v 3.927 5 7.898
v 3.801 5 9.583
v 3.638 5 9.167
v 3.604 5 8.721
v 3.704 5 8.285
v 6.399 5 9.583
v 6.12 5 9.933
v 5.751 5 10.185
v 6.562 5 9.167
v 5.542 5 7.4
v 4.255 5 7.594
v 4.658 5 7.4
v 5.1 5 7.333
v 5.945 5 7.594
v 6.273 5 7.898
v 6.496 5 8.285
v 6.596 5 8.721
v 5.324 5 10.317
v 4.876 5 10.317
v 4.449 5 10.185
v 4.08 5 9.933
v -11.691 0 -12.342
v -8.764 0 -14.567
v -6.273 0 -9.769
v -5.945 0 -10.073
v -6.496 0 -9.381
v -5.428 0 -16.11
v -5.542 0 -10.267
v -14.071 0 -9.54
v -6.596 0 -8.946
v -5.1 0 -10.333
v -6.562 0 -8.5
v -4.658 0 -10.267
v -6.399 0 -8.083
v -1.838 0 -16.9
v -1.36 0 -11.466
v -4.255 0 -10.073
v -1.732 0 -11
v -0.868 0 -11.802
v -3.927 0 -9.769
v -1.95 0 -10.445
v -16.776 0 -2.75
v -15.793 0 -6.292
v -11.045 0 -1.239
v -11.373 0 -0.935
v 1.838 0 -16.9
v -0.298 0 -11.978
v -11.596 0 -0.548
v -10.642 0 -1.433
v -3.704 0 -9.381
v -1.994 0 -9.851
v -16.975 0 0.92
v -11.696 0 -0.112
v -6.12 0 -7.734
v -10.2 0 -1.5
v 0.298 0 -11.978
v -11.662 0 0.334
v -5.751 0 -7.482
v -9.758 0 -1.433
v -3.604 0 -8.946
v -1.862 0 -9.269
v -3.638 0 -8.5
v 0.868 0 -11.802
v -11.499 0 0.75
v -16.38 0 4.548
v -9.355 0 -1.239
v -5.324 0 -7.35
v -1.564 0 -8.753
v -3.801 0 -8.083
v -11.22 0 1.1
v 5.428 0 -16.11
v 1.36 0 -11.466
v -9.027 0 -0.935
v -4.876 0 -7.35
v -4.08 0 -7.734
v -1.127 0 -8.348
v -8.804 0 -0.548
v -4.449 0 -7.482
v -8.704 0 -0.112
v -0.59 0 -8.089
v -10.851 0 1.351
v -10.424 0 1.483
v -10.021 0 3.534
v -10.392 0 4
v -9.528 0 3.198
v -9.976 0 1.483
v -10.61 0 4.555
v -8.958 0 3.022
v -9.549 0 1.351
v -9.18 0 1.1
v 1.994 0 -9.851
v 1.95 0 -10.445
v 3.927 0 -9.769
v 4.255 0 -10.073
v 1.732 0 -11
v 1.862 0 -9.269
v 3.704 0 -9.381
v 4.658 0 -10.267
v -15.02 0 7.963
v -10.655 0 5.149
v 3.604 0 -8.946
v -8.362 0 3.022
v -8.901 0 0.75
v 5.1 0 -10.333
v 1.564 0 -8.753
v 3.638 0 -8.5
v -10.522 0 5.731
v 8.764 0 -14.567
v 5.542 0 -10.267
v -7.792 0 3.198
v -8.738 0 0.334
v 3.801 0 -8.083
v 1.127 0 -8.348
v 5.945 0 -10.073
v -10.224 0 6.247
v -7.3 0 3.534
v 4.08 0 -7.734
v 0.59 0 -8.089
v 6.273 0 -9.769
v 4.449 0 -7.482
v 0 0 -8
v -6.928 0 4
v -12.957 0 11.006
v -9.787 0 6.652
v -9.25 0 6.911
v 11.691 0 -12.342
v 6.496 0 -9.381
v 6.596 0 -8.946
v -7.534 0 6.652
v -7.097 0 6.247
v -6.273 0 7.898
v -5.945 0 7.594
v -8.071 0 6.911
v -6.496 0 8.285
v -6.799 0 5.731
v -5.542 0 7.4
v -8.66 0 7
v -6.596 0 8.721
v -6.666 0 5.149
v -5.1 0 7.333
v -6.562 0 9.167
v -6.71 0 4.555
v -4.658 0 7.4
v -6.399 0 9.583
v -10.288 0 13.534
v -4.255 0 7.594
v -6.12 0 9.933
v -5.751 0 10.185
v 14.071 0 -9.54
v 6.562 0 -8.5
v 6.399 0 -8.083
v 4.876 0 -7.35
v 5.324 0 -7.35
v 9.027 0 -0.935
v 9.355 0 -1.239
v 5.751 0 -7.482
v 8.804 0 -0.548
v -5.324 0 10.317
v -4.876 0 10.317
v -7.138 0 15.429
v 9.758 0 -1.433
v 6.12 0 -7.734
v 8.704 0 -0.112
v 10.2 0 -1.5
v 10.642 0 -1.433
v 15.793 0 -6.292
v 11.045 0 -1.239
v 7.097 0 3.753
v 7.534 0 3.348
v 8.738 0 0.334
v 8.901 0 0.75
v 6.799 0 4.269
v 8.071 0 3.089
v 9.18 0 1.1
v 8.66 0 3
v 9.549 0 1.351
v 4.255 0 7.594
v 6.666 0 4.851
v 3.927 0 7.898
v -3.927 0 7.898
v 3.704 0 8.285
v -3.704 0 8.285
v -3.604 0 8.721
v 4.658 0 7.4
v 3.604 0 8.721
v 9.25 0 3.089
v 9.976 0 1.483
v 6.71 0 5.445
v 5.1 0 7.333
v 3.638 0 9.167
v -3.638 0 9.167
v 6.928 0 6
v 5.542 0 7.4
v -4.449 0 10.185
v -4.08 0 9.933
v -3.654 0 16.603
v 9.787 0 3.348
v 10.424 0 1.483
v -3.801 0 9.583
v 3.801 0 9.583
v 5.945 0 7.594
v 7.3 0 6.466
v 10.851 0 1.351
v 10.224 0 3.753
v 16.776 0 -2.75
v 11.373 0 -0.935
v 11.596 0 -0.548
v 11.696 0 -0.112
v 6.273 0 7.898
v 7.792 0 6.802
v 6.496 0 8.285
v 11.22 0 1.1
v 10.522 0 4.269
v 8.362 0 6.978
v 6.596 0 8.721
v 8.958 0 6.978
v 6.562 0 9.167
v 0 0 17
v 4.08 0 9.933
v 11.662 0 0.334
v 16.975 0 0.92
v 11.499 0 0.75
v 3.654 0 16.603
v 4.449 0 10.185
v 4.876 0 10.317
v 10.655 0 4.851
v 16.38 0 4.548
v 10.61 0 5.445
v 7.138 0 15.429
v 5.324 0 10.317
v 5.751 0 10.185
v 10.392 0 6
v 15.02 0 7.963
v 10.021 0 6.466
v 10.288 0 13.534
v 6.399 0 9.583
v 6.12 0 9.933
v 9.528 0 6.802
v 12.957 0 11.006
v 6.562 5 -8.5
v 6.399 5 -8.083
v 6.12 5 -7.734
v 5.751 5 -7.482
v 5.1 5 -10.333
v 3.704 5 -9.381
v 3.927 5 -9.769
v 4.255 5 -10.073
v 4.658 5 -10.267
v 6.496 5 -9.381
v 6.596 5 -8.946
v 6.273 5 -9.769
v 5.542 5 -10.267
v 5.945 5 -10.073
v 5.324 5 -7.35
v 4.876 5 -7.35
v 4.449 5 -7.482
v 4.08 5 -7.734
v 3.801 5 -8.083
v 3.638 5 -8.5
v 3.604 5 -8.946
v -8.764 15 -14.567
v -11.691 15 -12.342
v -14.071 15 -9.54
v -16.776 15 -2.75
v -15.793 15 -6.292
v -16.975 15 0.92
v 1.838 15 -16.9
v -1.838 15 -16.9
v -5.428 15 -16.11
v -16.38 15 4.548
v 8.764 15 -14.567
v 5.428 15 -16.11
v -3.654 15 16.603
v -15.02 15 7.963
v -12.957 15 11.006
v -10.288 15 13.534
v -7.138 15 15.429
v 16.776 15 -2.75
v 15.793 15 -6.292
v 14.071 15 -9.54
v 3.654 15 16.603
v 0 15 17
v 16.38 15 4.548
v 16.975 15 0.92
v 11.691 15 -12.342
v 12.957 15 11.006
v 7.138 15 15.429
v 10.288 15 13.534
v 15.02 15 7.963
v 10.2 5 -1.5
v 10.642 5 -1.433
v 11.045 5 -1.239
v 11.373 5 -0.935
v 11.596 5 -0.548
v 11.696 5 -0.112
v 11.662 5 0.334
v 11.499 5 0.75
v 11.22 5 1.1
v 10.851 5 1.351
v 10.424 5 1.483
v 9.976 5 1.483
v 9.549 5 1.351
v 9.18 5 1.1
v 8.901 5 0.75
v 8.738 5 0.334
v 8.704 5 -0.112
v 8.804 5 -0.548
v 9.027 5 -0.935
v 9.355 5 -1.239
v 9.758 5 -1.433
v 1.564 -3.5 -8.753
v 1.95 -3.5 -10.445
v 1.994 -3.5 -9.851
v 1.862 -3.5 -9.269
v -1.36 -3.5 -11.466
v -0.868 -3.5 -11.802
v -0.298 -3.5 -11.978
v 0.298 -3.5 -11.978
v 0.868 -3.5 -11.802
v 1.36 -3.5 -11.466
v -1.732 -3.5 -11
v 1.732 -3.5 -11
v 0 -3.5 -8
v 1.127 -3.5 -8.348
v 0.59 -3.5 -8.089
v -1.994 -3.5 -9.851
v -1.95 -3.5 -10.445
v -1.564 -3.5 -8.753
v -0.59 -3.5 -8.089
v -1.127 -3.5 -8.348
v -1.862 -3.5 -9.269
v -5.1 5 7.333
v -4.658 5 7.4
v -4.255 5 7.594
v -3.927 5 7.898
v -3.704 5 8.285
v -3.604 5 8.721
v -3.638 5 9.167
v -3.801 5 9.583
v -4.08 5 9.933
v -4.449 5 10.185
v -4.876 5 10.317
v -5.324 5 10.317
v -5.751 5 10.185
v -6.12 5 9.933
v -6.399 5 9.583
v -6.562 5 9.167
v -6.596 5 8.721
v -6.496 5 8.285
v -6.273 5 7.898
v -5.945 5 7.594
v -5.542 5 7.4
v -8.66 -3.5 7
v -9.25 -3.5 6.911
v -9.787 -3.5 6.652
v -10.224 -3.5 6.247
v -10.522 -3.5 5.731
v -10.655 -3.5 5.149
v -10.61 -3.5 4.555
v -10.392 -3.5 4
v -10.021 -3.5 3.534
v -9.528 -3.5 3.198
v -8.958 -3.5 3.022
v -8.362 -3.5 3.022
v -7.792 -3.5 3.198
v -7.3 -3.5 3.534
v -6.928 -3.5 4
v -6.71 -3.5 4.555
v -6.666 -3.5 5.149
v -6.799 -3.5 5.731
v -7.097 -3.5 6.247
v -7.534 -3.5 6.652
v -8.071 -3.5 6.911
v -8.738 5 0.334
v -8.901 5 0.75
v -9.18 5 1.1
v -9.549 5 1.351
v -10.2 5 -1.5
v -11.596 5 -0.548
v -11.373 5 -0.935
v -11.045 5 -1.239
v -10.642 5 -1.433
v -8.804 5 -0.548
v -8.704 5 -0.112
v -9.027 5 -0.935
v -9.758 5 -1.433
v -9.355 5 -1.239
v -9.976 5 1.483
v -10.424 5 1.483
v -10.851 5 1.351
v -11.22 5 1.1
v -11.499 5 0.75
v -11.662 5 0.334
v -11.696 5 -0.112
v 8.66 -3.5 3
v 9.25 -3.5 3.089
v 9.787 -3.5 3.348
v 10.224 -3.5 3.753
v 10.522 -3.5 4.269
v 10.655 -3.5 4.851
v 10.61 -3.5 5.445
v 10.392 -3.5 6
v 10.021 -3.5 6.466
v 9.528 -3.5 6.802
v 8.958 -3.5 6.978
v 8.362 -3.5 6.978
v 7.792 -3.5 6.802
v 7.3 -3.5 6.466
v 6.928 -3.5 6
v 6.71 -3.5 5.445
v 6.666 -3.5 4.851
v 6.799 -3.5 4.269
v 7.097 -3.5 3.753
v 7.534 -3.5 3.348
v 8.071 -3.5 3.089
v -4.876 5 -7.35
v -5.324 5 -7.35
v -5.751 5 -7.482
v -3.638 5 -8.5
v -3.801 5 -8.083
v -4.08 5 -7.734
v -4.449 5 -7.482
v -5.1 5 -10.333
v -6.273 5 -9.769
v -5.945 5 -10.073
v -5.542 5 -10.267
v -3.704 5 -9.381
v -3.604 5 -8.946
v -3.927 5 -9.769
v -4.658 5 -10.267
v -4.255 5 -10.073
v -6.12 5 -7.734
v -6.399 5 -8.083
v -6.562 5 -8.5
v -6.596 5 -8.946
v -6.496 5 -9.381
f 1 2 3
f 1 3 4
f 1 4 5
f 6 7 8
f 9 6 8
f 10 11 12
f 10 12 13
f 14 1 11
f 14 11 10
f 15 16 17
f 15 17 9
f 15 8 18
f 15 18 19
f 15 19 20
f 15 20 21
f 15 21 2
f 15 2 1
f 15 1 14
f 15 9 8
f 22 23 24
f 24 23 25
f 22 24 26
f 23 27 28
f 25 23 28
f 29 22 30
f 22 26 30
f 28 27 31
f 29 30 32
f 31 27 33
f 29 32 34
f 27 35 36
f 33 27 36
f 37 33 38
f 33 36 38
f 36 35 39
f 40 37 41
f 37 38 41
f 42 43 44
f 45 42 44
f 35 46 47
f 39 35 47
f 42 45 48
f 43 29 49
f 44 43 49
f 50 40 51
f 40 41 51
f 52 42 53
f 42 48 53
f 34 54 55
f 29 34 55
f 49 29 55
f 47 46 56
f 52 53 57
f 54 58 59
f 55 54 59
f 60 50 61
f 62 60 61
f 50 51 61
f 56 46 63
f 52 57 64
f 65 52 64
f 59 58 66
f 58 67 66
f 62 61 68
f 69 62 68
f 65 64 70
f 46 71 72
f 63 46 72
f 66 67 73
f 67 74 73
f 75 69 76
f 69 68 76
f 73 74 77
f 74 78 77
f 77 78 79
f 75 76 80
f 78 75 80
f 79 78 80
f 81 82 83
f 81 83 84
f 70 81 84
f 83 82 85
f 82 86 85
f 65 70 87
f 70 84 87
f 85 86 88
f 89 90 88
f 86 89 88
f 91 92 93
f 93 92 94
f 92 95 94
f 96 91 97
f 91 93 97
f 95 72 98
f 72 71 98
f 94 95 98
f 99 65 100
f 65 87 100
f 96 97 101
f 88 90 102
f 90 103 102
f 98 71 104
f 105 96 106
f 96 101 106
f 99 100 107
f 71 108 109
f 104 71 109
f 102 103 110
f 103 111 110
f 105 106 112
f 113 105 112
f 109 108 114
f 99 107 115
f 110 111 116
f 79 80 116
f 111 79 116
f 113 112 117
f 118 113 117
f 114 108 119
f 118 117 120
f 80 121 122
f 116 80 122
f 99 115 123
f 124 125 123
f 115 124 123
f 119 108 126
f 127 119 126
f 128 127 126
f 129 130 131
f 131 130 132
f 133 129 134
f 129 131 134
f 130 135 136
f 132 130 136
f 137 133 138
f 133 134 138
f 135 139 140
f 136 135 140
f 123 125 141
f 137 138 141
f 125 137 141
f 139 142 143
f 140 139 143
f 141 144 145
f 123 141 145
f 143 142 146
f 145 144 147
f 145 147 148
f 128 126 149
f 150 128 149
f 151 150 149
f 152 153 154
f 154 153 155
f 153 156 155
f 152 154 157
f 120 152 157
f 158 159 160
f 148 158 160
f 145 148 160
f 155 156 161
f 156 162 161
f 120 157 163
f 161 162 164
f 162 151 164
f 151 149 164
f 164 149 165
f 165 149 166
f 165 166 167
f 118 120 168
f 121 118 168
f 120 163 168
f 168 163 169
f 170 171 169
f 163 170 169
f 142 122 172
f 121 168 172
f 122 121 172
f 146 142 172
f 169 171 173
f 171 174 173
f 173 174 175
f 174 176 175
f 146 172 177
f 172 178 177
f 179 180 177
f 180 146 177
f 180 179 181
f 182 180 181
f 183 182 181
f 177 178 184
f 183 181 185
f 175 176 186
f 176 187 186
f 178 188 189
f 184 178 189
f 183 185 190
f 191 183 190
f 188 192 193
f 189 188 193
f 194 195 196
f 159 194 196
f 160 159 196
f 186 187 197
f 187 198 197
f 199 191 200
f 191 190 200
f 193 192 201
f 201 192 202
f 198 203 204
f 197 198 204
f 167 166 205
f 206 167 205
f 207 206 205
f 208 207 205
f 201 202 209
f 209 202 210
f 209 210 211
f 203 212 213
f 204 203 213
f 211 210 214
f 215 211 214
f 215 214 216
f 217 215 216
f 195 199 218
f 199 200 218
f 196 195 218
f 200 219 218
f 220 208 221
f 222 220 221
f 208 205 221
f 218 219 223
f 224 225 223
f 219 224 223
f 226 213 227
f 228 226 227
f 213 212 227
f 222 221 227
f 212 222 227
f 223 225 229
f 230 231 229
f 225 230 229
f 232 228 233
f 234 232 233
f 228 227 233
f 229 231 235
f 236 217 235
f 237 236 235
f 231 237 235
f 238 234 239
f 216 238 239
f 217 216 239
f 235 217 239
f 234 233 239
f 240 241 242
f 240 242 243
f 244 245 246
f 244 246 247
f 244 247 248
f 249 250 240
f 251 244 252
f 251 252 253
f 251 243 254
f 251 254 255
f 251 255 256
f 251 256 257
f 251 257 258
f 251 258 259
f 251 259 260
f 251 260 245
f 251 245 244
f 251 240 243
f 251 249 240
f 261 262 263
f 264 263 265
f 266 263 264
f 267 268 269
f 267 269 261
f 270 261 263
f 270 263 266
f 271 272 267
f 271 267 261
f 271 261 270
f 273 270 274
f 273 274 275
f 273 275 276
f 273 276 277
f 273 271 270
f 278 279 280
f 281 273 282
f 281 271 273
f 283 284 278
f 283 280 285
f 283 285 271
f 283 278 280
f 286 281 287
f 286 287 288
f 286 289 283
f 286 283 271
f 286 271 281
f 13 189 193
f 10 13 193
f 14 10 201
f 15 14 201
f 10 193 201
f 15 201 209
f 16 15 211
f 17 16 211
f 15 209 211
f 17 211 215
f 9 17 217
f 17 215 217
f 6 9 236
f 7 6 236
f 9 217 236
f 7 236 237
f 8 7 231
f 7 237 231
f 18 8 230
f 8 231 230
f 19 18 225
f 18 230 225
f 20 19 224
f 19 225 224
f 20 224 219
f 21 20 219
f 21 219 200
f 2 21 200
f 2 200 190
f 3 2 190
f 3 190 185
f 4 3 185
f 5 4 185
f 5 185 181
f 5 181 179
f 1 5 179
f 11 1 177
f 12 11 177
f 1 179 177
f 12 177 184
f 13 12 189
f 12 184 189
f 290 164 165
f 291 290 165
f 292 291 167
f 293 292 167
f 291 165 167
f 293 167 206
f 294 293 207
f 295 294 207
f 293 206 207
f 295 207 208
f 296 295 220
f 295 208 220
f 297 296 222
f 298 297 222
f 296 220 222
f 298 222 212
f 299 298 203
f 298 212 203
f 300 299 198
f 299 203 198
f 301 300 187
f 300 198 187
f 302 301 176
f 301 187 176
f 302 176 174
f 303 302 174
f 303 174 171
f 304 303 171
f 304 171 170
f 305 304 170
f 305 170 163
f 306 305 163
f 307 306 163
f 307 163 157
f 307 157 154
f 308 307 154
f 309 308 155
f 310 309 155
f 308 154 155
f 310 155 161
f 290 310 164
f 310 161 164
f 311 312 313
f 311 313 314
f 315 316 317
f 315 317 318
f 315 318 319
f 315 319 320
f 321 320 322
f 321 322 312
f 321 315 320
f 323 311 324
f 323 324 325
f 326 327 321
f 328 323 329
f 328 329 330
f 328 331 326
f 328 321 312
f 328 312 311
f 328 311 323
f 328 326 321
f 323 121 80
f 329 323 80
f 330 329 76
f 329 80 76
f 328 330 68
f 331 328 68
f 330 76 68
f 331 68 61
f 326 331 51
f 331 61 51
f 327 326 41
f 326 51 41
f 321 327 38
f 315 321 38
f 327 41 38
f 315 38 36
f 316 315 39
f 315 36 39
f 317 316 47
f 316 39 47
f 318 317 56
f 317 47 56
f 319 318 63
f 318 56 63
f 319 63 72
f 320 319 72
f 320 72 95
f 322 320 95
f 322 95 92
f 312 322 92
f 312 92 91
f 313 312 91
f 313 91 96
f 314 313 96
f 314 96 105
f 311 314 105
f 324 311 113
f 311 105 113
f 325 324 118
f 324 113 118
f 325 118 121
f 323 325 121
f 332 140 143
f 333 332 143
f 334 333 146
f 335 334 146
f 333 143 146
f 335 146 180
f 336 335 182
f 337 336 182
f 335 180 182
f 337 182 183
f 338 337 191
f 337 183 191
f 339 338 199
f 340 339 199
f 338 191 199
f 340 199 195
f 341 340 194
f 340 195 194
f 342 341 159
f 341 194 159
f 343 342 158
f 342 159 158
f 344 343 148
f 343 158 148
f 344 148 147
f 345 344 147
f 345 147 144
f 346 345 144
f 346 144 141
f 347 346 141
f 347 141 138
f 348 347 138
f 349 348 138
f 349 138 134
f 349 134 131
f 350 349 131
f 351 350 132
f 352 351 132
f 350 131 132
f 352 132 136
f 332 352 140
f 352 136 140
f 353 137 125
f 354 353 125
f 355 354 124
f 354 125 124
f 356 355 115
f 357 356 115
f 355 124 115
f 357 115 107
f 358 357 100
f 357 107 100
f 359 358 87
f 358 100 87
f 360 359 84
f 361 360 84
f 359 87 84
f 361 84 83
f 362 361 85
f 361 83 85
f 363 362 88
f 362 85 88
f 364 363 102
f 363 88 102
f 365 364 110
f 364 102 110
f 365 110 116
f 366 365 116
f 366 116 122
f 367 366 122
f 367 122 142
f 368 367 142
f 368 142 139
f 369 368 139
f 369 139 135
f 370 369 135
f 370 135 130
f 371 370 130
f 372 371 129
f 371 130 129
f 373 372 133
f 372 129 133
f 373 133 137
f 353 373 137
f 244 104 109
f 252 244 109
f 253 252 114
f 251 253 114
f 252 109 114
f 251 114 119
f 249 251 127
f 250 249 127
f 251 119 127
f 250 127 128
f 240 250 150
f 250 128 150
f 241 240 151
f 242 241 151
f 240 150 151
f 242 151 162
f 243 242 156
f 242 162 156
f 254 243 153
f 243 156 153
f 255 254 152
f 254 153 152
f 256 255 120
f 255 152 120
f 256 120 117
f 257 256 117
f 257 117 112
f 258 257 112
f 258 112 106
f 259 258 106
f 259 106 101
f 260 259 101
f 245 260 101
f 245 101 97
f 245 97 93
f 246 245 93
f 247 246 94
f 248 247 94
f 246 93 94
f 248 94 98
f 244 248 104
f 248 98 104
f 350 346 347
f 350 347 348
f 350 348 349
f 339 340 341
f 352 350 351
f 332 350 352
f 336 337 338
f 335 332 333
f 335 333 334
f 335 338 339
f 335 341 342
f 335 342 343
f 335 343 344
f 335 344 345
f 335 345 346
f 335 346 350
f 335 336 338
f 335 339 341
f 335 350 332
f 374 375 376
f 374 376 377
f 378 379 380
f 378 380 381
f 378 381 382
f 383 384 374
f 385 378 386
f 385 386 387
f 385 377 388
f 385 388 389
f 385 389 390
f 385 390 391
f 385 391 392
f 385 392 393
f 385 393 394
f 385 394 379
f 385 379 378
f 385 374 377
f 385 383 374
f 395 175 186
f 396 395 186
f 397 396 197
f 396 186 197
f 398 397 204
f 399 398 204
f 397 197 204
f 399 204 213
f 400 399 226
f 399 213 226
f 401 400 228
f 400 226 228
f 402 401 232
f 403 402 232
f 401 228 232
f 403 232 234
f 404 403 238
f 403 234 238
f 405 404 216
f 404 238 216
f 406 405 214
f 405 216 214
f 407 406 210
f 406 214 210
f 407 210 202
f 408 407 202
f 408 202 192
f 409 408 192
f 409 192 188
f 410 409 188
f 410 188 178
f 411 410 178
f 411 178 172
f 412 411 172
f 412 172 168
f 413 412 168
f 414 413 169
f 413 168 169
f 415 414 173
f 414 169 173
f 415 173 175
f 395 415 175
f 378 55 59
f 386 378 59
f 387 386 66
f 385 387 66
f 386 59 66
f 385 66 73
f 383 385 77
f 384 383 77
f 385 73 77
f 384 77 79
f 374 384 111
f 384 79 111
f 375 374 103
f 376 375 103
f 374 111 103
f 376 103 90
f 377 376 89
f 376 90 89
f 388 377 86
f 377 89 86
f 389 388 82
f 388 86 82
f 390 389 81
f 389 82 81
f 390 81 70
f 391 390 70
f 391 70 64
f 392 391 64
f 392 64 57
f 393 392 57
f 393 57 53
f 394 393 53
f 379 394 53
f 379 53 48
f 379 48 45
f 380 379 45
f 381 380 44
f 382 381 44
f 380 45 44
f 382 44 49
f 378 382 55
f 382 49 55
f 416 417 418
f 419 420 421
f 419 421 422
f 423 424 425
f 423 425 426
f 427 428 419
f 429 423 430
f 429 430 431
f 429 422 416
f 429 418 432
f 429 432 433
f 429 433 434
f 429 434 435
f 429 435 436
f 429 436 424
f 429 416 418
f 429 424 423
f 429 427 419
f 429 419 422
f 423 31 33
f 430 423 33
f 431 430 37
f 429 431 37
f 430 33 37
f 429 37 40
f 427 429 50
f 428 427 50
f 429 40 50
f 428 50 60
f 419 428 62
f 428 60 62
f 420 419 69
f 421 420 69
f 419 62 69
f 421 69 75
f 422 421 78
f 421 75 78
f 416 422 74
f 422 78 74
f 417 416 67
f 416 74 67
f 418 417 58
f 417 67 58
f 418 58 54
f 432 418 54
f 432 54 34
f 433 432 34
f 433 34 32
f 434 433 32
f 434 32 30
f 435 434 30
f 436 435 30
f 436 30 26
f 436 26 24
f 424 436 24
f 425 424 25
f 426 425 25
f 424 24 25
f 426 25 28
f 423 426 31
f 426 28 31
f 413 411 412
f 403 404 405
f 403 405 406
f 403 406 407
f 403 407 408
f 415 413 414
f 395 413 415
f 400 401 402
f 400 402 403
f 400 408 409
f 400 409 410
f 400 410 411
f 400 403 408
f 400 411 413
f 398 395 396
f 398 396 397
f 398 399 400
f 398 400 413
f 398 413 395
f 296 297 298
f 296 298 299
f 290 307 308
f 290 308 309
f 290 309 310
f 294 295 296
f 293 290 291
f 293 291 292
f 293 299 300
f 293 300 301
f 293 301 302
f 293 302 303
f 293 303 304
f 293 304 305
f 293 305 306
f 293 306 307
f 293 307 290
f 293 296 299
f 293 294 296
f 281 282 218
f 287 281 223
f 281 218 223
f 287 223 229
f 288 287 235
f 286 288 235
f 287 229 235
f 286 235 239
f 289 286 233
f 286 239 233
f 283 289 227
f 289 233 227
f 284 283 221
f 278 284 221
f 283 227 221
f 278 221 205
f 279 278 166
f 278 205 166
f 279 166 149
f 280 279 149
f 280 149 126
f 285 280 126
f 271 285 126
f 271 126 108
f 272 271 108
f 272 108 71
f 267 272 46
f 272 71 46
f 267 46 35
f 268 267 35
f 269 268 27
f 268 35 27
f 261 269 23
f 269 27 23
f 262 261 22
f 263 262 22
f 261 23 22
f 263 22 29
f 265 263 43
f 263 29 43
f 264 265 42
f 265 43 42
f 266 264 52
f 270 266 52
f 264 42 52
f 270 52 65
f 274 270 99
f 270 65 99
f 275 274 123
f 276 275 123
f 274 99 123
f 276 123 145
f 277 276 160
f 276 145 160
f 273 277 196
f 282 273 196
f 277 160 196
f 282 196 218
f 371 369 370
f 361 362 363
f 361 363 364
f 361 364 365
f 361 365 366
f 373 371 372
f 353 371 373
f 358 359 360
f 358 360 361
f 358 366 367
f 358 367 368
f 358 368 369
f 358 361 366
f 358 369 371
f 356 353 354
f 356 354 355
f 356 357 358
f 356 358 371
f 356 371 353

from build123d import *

# Parameters (mm, degrees)
SKETCH_7_R          = 17
EXTRUDE_6_DEPTH     = 15
SKETCH_8_R          = 1.5
CUT_EXTRUDE_2_DEPTH = 5
SKETCH_9_R          = 2
EXTRUDE_7_DEPTH     = 3.5


with BuildPart() as part:
    # Эскиз7 → Бобышка-Вытянуть6 (new body)
    with BuildSketch(Plane(origin=(0, 0, 0), x_dir=(1, 0, 0), z_dir=(0, 1, 0))):
        with Locations(Location((0, 0, 0), (0, 0, 270))):
            Circle(SKETCH_7_R)
    extrude(amount=EXTRUDE_6_DEPTH)

    # Эскиз8 → Вырез-Вытянуть2 (cut)
    with BuildSketch(Plane.XZ):
        with Locations(Location((-5.1, 8.833459119, 0), (0, 0, 270))):
            Circle(SKETCH_8_R)
        with Locations(Location((5.1, 8.833459119, 0), (0, 0, 270))):
            Circle(SKETCH_8_R)
        with Locations(Location((-10.2, 0, 0), (0, 0, 270))):
            Circle(SKETCH_8_R)
        with Locations(Location((-5.1, -8.833459119, 0), (0, 0, 270))):
            Circle(SKETCH_8_R)
        with Locations(Location((10.2, 0, 0), (0, 0, 270))):
            Circle(SKETCH_8_R)
        with Locations(Location((5.1, -8.833459119, 0), (0, 0, 270))):
            Circle(SKETCH_8_R)
    extrude(amount=-CUT_EXTRUDE_2_DEPTH, mode=Mode.SUBTRACT)

    # Эскиз9 → Бобышка-Вытянуть7 (add)
    with BuildSketch(Plane.XZ):
        with Locations(Location((8.660254038, 5, 0), (0, 0, 270))):
            Circle(SKETCH_9_R)
        with Locations(Location((0, -10, 0), (0, 0, 90))):
            Circle(SKETCH_9_R)
        with Locations(Location((-8.660254038, 5, 0), (0, 0, 90))):
            Circle(SKETCH_9_R)
    extrude(amount=EXTRUDE_7_DEPTH)


solid = part.part
